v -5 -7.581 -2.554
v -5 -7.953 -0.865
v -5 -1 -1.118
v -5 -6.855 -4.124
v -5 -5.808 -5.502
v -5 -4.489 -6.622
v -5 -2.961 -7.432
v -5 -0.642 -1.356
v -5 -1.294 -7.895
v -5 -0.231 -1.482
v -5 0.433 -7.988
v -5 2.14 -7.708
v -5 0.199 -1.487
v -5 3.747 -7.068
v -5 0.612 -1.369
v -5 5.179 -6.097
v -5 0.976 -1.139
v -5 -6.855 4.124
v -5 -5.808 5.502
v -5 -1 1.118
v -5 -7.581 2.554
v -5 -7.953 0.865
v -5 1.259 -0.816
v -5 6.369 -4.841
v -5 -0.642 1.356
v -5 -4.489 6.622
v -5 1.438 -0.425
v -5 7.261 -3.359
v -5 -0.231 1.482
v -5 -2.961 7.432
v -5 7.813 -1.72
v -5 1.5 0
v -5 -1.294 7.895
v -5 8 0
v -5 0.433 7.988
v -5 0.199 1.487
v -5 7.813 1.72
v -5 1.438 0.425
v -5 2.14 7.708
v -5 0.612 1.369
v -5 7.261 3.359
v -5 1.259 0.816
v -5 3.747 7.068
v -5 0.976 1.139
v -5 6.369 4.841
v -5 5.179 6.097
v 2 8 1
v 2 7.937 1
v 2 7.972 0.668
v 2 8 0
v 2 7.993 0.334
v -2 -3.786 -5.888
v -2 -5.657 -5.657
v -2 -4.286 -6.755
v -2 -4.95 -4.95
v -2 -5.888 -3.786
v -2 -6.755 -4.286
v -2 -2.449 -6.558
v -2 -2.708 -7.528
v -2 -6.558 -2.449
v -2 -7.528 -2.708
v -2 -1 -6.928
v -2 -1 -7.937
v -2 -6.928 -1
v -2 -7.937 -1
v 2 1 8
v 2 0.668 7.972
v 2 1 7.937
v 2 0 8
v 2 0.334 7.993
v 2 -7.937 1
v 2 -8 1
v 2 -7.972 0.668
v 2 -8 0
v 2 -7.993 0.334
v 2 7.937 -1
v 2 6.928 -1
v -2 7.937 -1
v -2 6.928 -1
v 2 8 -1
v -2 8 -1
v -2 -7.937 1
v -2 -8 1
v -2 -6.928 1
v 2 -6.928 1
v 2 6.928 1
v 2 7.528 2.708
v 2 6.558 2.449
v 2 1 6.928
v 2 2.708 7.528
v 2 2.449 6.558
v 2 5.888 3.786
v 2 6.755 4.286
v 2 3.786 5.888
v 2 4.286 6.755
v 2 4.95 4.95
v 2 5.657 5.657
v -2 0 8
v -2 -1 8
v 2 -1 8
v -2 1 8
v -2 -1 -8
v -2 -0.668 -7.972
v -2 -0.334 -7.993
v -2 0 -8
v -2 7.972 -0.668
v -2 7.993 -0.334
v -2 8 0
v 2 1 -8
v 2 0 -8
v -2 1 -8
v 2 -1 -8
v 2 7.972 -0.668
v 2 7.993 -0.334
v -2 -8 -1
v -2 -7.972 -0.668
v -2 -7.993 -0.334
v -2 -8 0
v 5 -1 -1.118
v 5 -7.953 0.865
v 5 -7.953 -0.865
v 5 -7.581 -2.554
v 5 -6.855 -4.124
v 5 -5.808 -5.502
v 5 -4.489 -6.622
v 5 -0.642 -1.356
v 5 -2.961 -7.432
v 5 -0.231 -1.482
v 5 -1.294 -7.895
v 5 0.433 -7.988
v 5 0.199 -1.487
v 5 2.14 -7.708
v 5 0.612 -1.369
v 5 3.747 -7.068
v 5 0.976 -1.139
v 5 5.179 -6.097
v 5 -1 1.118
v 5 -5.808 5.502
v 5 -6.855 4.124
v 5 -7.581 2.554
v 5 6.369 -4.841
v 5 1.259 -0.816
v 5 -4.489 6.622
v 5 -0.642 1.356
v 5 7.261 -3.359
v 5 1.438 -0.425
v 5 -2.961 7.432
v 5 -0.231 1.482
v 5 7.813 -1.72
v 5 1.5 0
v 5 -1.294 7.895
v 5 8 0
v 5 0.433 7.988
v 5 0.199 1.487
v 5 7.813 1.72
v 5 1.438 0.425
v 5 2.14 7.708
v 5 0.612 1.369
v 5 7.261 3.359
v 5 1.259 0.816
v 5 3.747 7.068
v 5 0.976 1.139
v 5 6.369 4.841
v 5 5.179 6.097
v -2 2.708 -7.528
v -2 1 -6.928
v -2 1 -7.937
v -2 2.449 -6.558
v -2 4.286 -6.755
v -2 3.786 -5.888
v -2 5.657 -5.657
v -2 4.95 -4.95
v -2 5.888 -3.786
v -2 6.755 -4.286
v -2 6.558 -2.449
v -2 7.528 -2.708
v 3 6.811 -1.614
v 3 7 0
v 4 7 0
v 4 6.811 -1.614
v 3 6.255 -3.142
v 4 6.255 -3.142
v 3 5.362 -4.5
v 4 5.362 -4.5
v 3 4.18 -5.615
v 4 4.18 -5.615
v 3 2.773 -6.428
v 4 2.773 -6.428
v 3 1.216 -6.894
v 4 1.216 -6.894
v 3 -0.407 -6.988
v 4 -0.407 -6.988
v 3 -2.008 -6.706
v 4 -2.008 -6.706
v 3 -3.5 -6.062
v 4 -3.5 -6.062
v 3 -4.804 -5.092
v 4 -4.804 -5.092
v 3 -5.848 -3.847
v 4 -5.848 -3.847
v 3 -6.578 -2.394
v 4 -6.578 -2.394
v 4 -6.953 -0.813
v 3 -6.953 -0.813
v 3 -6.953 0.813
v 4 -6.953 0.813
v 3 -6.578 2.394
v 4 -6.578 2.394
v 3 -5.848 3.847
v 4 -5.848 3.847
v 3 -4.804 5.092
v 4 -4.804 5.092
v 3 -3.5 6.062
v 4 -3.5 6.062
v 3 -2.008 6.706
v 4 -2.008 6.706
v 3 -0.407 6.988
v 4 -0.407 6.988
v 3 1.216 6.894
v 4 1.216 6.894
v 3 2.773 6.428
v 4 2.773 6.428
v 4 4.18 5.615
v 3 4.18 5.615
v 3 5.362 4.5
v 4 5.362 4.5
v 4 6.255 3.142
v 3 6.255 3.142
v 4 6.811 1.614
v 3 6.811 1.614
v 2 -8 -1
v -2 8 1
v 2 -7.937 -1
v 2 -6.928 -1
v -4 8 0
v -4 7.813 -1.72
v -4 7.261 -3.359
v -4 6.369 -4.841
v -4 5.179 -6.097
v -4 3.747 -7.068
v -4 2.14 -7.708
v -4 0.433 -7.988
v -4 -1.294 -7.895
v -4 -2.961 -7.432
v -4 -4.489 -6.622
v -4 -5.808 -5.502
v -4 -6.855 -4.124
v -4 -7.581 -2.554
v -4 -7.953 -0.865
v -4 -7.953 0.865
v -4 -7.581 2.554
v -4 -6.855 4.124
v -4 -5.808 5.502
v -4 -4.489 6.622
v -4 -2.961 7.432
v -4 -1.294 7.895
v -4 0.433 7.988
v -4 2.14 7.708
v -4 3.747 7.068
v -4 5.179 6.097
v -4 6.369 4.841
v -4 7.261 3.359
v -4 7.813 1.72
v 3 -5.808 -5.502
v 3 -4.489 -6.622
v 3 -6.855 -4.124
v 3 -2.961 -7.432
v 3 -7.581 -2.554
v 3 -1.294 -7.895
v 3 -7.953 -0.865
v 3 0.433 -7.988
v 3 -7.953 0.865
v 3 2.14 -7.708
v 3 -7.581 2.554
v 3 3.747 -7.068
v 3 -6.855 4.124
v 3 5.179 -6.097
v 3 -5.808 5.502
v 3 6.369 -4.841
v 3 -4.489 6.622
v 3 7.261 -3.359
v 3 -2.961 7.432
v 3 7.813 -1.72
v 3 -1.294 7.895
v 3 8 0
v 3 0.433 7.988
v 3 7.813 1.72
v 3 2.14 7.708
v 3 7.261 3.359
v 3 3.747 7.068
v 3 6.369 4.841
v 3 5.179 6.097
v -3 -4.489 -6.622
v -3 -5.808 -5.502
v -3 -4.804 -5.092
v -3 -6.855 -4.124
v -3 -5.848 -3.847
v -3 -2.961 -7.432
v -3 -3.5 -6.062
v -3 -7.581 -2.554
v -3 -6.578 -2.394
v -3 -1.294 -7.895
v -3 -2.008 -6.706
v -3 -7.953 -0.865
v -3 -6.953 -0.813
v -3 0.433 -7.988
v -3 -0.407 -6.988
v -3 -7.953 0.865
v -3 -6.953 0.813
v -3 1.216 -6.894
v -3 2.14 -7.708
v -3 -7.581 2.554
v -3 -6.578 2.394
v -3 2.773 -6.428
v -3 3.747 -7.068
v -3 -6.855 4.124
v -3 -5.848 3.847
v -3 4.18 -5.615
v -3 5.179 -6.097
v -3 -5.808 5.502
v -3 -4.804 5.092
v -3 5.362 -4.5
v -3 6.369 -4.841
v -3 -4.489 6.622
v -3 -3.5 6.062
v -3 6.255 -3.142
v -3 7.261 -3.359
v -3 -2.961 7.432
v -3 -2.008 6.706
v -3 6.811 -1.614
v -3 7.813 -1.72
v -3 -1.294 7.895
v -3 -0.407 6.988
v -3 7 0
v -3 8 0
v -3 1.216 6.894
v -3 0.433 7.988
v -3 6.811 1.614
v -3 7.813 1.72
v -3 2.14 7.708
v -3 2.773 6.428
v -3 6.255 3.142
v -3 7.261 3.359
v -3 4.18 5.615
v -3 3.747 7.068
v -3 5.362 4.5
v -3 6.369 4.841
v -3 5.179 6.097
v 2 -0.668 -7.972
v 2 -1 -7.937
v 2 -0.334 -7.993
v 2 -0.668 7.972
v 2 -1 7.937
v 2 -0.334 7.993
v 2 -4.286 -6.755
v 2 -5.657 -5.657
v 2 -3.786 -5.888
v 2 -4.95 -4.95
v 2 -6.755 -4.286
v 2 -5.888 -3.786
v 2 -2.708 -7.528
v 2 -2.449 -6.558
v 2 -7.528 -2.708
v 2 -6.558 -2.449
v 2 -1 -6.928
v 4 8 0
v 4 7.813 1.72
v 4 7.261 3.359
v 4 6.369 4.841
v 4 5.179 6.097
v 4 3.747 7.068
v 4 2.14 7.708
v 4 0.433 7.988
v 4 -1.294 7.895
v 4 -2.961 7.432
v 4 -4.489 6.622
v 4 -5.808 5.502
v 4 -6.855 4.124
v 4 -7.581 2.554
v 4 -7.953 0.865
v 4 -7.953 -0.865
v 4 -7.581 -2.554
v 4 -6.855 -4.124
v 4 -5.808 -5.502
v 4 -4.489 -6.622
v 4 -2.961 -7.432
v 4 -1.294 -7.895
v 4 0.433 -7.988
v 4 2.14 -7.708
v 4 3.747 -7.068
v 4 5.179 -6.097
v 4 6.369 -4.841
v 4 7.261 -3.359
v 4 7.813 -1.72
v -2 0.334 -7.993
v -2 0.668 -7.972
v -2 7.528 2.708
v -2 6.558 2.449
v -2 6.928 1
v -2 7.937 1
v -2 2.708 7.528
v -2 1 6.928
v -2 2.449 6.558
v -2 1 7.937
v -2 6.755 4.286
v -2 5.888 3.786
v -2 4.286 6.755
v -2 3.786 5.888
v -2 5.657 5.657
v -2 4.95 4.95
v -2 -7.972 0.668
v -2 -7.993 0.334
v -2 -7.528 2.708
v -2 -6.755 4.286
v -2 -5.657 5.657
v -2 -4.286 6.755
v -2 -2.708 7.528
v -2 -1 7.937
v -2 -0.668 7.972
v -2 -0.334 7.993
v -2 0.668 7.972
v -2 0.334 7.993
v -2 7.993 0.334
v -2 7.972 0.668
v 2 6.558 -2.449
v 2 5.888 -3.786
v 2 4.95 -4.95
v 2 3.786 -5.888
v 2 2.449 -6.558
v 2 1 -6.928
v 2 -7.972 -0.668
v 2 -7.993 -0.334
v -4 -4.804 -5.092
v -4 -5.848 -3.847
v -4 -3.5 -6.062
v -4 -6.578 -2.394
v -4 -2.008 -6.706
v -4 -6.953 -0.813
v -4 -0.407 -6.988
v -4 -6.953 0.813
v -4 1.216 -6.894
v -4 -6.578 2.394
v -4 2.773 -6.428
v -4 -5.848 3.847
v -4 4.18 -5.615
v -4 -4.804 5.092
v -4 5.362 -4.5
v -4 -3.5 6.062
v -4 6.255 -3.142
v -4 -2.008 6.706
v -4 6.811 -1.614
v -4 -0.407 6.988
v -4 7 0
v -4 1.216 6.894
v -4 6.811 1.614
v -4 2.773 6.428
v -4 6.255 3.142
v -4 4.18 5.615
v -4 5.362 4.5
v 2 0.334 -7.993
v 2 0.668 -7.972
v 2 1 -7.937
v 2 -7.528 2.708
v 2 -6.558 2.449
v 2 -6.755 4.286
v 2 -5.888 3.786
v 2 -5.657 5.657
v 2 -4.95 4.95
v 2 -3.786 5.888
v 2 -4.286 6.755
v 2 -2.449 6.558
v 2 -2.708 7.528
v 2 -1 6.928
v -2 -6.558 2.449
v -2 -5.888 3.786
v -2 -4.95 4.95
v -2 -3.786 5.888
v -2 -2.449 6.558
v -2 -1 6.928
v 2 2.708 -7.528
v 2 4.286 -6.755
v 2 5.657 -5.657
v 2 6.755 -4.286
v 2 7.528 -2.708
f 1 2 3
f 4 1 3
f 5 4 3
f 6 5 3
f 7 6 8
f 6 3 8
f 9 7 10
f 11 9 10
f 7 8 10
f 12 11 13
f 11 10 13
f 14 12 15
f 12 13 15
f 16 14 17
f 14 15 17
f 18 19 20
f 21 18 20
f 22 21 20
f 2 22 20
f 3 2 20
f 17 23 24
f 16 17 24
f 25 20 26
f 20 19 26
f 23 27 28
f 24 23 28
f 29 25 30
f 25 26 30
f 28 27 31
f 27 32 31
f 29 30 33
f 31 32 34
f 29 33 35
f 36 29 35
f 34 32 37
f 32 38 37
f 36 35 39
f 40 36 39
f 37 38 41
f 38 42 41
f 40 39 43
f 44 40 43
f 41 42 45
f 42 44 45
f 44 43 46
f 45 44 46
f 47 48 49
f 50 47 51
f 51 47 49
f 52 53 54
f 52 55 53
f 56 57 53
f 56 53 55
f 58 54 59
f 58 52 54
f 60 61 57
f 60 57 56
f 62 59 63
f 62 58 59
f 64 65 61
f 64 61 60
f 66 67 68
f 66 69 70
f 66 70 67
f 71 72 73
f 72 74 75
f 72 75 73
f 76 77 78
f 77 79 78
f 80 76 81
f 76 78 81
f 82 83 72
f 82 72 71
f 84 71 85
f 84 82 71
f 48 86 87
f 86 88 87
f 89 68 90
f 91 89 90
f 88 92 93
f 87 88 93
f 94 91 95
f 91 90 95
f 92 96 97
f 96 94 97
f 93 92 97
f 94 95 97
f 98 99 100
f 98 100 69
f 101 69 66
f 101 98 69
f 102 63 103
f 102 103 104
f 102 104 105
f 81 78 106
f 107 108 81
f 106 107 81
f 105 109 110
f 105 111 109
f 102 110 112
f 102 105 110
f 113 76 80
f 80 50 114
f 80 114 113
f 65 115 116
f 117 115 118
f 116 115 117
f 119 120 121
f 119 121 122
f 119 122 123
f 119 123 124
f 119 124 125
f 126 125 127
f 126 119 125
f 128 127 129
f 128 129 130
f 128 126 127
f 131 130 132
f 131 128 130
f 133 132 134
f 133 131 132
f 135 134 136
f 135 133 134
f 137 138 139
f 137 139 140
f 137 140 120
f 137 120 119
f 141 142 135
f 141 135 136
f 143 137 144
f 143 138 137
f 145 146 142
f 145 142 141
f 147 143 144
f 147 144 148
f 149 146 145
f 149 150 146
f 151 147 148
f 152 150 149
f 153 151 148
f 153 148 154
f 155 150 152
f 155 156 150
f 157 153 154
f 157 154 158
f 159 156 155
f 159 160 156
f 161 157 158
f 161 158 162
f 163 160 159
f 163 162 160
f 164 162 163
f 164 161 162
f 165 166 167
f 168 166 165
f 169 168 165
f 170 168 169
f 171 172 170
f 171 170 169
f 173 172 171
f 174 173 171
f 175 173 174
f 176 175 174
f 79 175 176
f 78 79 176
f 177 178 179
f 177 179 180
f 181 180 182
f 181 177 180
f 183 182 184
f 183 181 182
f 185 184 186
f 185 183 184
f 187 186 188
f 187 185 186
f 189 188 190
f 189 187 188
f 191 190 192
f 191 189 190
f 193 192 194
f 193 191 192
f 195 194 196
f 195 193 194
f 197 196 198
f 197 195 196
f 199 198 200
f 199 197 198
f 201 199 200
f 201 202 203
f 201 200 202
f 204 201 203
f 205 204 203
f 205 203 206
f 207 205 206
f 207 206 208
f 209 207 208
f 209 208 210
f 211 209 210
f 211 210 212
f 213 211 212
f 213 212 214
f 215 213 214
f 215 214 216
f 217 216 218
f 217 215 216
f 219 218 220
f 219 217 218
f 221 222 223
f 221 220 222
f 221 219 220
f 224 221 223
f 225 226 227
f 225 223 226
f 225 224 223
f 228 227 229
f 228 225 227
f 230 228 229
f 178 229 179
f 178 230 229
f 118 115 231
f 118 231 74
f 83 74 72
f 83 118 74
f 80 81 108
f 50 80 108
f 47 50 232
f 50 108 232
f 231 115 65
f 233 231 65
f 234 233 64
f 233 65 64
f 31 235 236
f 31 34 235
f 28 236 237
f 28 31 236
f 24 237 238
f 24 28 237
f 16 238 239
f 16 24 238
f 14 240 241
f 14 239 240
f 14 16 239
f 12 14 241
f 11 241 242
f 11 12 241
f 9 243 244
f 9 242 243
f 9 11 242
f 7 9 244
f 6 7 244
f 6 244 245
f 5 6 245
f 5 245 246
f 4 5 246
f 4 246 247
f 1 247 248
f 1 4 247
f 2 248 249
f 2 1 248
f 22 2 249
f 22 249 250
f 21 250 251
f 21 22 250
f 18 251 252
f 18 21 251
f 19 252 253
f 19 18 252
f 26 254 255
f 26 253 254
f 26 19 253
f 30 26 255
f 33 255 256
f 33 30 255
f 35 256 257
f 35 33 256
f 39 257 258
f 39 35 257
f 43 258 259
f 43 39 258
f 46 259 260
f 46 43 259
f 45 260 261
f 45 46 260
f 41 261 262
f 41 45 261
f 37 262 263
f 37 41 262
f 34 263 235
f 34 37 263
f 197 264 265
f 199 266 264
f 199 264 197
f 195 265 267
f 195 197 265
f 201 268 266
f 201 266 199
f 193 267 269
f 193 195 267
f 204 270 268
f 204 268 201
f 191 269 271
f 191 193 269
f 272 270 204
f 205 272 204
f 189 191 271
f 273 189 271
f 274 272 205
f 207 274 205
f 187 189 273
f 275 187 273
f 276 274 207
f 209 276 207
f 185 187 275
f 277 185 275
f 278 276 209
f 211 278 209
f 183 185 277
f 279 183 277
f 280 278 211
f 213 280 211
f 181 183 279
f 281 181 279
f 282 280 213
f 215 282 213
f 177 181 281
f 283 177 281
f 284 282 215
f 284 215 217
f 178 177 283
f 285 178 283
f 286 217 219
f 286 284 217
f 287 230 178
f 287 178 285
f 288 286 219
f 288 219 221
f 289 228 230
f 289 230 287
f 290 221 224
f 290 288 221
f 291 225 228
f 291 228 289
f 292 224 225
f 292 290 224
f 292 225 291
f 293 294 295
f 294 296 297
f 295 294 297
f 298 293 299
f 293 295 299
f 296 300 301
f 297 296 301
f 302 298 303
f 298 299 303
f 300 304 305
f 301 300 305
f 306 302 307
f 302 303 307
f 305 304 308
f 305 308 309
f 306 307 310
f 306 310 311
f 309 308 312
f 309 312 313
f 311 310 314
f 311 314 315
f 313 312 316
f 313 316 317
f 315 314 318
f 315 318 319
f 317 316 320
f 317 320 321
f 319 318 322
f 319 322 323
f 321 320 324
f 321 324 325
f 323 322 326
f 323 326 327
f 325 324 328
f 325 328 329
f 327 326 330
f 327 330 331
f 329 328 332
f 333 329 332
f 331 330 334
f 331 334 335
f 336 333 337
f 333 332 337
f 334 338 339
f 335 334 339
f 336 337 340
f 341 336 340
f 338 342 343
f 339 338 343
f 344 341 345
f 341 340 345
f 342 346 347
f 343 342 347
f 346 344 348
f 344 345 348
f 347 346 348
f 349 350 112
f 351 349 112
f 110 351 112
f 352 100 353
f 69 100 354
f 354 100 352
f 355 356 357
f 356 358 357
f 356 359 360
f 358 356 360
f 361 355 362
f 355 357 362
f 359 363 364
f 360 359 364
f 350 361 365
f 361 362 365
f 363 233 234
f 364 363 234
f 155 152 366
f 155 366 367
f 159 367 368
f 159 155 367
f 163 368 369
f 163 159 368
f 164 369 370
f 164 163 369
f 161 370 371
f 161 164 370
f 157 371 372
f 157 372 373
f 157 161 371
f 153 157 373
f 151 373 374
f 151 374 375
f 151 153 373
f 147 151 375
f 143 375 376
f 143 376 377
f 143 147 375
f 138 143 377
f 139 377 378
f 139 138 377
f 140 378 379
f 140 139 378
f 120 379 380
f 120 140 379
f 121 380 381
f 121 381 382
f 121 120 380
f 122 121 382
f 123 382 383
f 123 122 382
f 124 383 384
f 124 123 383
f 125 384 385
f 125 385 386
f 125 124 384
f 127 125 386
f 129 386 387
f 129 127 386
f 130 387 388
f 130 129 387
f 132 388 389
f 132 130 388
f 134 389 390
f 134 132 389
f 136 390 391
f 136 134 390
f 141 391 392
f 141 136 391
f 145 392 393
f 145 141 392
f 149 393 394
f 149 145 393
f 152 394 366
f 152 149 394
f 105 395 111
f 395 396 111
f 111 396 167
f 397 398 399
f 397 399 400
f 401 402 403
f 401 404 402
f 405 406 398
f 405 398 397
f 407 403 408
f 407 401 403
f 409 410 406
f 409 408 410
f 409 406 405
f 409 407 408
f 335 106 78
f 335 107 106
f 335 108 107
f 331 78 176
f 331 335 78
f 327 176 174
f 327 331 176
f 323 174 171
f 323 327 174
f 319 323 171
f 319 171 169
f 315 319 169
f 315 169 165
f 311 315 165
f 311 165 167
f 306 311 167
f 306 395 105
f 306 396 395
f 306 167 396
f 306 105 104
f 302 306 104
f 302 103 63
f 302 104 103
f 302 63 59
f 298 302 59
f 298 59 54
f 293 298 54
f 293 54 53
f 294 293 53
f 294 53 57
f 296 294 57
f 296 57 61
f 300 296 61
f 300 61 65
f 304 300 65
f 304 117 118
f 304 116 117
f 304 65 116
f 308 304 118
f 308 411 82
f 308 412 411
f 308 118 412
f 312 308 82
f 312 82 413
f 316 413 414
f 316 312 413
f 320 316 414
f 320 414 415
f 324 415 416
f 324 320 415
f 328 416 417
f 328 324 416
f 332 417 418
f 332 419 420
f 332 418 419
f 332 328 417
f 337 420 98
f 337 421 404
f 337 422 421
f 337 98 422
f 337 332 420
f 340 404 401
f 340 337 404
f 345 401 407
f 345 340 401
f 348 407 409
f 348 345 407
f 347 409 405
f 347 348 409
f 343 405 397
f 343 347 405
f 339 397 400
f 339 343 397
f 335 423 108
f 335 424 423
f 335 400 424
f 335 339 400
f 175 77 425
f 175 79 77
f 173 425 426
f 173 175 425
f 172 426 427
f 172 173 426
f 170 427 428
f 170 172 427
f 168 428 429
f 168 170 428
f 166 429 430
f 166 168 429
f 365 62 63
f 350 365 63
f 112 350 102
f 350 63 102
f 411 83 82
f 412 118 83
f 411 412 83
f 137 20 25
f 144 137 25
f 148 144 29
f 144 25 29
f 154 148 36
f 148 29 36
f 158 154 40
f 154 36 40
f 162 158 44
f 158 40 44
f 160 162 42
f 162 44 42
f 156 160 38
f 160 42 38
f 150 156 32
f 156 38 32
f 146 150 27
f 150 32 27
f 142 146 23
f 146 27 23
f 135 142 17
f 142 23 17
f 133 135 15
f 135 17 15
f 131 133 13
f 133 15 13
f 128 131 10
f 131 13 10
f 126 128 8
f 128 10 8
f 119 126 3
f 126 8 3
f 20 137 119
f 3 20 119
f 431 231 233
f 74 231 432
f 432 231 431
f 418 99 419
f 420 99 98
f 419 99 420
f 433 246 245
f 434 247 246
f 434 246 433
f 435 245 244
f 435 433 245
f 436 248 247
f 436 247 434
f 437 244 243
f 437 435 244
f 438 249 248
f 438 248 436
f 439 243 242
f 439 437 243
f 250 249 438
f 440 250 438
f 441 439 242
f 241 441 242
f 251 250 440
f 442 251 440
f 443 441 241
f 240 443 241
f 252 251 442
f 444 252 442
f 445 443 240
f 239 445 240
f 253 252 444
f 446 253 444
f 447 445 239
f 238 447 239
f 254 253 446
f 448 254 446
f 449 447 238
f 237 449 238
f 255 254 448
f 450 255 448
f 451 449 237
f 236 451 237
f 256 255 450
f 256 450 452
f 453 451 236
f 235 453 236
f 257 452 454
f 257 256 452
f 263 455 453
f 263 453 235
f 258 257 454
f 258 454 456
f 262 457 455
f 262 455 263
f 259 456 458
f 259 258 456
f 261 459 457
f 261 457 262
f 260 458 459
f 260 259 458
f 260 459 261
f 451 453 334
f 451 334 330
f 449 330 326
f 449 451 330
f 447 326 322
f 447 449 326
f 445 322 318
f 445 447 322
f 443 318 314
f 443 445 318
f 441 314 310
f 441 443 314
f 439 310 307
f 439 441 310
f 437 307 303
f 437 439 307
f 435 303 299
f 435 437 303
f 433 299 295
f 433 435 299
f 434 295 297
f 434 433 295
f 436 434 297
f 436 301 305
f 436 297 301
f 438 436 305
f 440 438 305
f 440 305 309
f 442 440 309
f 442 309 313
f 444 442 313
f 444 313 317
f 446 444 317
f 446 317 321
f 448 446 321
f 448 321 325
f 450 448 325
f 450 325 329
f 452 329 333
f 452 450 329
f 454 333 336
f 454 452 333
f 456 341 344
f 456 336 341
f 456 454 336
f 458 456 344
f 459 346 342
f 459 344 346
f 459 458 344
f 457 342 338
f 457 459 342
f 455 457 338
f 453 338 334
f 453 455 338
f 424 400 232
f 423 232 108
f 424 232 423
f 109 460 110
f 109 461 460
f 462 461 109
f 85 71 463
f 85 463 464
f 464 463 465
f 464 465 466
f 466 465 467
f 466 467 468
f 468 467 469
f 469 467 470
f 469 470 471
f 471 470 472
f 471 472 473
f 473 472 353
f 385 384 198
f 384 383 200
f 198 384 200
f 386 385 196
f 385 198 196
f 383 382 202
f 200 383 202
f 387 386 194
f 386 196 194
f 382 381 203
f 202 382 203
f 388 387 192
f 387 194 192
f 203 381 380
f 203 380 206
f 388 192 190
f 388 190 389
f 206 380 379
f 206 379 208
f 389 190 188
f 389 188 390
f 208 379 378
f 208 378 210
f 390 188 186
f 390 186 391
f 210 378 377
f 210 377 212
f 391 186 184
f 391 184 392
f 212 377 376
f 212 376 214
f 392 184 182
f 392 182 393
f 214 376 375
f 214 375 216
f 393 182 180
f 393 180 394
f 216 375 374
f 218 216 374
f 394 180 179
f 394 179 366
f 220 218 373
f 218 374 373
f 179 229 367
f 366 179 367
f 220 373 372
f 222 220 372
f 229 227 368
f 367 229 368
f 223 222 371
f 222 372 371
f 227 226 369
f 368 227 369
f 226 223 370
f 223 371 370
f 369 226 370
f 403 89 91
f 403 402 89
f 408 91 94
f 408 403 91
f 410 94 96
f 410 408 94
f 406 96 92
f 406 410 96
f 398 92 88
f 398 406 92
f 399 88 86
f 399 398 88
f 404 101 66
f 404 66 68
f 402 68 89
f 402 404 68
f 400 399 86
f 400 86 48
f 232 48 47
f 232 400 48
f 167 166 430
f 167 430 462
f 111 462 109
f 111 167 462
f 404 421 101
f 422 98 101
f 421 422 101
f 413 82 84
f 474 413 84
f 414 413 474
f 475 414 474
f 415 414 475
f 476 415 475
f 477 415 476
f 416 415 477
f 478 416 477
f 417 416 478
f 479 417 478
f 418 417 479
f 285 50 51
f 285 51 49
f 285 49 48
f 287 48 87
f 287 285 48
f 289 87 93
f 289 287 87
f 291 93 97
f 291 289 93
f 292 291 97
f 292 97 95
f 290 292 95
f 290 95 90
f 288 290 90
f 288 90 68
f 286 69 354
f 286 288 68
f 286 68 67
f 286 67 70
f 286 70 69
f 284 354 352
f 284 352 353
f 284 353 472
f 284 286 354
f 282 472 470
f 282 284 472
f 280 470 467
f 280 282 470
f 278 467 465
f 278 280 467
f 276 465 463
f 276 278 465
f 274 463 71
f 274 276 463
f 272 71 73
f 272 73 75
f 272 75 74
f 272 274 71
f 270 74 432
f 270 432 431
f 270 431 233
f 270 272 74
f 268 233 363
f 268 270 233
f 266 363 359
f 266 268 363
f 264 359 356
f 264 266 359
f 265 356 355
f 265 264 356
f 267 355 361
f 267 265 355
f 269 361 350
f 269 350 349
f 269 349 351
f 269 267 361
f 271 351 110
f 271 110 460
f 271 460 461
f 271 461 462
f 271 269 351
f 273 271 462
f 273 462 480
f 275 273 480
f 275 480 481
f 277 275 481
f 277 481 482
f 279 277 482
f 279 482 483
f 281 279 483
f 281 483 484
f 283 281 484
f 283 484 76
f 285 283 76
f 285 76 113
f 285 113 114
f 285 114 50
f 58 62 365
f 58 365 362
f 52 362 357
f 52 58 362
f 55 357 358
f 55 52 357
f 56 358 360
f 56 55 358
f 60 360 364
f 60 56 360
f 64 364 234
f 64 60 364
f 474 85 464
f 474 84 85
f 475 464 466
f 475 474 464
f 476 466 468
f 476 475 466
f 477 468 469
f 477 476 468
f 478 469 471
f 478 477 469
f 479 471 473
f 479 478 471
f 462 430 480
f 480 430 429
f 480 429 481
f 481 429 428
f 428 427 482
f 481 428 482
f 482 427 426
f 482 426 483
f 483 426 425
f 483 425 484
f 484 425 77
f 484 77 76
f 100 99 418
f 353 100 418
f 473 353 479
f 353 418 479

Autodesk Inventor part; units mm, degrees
ref_plane "YZ Plane" through (0, 0, 0) normal (1, 0, 0) x (0, 1, 0)
ref_plane "XZ Plane" through (0, 0, 0) normal (0, 1, 0) x (-1, 0, 0)
ref_plane "XY Plane" through (0, 0, 0) normal (0, 0, 1) x (1, 0, 0)
sketch "Szkic1" plane through (0, 0, 0) normal (1, 0, 0) x (0, 1, 0)
  circle A0 centre (0, 0) radius 7
  circle A1 centre (0, 0) radius 1.5
  line L0 (0, 1.5) -> (0, -1.0846)
  line L1 (-1, 1.9718) -> (-1, -1.0846)
  line L2 (8, 0) -> (-8, 0)
  line L3 (-8, 0) -> (-8, -1)
  line L4 (-8, -1) -> (8, -1)
  line L5 (8, -1) -> (8, 0)
  line L6 (8, 0) -> (-8, 0)
  line L7 (-8, 0) -> (-8, 1)
  line L8 (-8, 1) -> (8, 1)
  line L9 (8, 1) -> (8, 0)
  line L10 (0, 8) -> (1, 8)
  line L11 (1, 8) -> (1, -8)
  line L12 (1, -8) -> (0, -8)
  line L13 (0, 8) -> (-1, 8)
  line L14 (-1, 8) -> (-1, -8)
  line L15 (-1, -8) -> (0, -8)
  line L16 (0, -8) -> (0, 8)
  point P0 (-1, -1.118)
  point P1 (-1, 1.118)
  point P2 (-6.9282, -1)
  point P3 (-6.9282, 1)
  point P4 (1, -6.9282)
  point P5 (-1, -6.9282)
  point P6 (6.9282, 1)
  point P7 (6.9282, -1)
  point P8 (-1, 6.9282)
  point P9 (1, 6.9282)
  dimension "d1" = 3
  dimension "d0" = 14
  dimension "d2" = 1
  dimension "d14" = 16
  dimension "d16" = 16
  dimension "d18" = 2
  dimension "d19" = 2
sketch "Szkic2" plane through (0, 0, 0) normal (0, 0, 1) x (1, 0, 0)
  line L0 (0, 0) -> (5, 0)
  line L1 (5, 0) -> (5, 7)
  line L2 (5, 7) -> (0, 7)
  line L3 (0, 7) -> (0, 0)
  line L4 (0, 0) -> (-5, 0)
  line L5 (-5, 0) -> (-5, 7)
  line L6 (-5, 7) -> (0, 7)
  line L7 (0, 7) -> (0, 0)
  line L8 (0, 0) -> (5, 0)
  line L9 (5, 0) -> (5, -7)
  line L10 (5, -7) -> (0, -7)
  line L11 (0, -7) -> (0, 0)
  line L12 (0, 0) -> (-5, 0)
  line L13 (-5, 0) -> (-5, -7)
  line L14 (-5, -7) -> (0, -7)
  line L15 (0, -7) -> (0, 0)
  line L16 (5, 7) -> (4, 7)
  line L17 (4, 7) -> (4, 8)
  line L18 (4, 8) -> (5, 8)
  line L19 (5, 8) -> (5, 7)
  line L20 (3, 7) -> (2, 7)
  line L21 (2, 7) -> (2, 8)
  line L22 (2, 8) -> (3, 8)
  line L23 (3, 8) -> (3, 7)
  line L24 (-5, 7) -> (-4, 7)
  line L25 (-4, 7) -> (-4, 8)
  line L26 (-4, 8) -> (-5, 8)
  line L27 (-5, 8) -> (-5, 7)
  line L28 (-3, 7) -> (-2, 7)
  line L29 (-2, 7) -> (-2, 8)
  line L30 (-2, 8) -> (-3, 8)
  line L31 (-3, 8) -> (-3, 7)
  dimension "d3" = 5
  dimension "d4" = 7
  dimension "d5" = 10
  dimension "d6" = 14
  dimension "d7" = 1
  dimension "d8" = 1
  dimension "d9" = 1
  dimension "d10" = 1
  dimension "d11" = 1
  dimension "d12" = 1
  dimension "d13" = 1
extrude "Wyciągnięcie proste1" add sketch "Szkic1" along normal mid plane 10 contours L2 A1 L8 A0 | A0 L4 A1 L2 | L8 A1 L11 A0 | A0 L11 A1 L4 | L11 A1 L16 A0 | A0 L16 A1 L11 | L16 A1 L1 L14 A0 | A0 L14 A1 L16 | L14 L1 A1 L8 A0 | A0 L4 A1 L14 | L2 A1 L8 L1 | L1 L4 A1 L2 | L8 A1 L2 A0 | L1 L8 A1 | A0 L2 A1 L4 | A1 L4 L1 L14
extrude "Wyciągnięcie proste2" add sketch "Szkic1" along normal mid plane 4 contours L2 L5 L4 A0 | A0 L8 L9 L2 | A0 L16 L10 L11 | L11 L12 L16 A0 | A0 L14 L13 L16 | L16 L15 L14 A0 | A0 L2 L7 L8 | L4 L3 L2 A0
revolve "Obrót1" add sketch "Szkic2" angle 360 about axis through (0, 0, 0) along (1, 0, 0) contours L2 L17 L18 L19 | L21 L22 L23 L2 | L6 L31 L30 L29 | L27 L26 L25 L6
properties part number "lepszy kolo"
